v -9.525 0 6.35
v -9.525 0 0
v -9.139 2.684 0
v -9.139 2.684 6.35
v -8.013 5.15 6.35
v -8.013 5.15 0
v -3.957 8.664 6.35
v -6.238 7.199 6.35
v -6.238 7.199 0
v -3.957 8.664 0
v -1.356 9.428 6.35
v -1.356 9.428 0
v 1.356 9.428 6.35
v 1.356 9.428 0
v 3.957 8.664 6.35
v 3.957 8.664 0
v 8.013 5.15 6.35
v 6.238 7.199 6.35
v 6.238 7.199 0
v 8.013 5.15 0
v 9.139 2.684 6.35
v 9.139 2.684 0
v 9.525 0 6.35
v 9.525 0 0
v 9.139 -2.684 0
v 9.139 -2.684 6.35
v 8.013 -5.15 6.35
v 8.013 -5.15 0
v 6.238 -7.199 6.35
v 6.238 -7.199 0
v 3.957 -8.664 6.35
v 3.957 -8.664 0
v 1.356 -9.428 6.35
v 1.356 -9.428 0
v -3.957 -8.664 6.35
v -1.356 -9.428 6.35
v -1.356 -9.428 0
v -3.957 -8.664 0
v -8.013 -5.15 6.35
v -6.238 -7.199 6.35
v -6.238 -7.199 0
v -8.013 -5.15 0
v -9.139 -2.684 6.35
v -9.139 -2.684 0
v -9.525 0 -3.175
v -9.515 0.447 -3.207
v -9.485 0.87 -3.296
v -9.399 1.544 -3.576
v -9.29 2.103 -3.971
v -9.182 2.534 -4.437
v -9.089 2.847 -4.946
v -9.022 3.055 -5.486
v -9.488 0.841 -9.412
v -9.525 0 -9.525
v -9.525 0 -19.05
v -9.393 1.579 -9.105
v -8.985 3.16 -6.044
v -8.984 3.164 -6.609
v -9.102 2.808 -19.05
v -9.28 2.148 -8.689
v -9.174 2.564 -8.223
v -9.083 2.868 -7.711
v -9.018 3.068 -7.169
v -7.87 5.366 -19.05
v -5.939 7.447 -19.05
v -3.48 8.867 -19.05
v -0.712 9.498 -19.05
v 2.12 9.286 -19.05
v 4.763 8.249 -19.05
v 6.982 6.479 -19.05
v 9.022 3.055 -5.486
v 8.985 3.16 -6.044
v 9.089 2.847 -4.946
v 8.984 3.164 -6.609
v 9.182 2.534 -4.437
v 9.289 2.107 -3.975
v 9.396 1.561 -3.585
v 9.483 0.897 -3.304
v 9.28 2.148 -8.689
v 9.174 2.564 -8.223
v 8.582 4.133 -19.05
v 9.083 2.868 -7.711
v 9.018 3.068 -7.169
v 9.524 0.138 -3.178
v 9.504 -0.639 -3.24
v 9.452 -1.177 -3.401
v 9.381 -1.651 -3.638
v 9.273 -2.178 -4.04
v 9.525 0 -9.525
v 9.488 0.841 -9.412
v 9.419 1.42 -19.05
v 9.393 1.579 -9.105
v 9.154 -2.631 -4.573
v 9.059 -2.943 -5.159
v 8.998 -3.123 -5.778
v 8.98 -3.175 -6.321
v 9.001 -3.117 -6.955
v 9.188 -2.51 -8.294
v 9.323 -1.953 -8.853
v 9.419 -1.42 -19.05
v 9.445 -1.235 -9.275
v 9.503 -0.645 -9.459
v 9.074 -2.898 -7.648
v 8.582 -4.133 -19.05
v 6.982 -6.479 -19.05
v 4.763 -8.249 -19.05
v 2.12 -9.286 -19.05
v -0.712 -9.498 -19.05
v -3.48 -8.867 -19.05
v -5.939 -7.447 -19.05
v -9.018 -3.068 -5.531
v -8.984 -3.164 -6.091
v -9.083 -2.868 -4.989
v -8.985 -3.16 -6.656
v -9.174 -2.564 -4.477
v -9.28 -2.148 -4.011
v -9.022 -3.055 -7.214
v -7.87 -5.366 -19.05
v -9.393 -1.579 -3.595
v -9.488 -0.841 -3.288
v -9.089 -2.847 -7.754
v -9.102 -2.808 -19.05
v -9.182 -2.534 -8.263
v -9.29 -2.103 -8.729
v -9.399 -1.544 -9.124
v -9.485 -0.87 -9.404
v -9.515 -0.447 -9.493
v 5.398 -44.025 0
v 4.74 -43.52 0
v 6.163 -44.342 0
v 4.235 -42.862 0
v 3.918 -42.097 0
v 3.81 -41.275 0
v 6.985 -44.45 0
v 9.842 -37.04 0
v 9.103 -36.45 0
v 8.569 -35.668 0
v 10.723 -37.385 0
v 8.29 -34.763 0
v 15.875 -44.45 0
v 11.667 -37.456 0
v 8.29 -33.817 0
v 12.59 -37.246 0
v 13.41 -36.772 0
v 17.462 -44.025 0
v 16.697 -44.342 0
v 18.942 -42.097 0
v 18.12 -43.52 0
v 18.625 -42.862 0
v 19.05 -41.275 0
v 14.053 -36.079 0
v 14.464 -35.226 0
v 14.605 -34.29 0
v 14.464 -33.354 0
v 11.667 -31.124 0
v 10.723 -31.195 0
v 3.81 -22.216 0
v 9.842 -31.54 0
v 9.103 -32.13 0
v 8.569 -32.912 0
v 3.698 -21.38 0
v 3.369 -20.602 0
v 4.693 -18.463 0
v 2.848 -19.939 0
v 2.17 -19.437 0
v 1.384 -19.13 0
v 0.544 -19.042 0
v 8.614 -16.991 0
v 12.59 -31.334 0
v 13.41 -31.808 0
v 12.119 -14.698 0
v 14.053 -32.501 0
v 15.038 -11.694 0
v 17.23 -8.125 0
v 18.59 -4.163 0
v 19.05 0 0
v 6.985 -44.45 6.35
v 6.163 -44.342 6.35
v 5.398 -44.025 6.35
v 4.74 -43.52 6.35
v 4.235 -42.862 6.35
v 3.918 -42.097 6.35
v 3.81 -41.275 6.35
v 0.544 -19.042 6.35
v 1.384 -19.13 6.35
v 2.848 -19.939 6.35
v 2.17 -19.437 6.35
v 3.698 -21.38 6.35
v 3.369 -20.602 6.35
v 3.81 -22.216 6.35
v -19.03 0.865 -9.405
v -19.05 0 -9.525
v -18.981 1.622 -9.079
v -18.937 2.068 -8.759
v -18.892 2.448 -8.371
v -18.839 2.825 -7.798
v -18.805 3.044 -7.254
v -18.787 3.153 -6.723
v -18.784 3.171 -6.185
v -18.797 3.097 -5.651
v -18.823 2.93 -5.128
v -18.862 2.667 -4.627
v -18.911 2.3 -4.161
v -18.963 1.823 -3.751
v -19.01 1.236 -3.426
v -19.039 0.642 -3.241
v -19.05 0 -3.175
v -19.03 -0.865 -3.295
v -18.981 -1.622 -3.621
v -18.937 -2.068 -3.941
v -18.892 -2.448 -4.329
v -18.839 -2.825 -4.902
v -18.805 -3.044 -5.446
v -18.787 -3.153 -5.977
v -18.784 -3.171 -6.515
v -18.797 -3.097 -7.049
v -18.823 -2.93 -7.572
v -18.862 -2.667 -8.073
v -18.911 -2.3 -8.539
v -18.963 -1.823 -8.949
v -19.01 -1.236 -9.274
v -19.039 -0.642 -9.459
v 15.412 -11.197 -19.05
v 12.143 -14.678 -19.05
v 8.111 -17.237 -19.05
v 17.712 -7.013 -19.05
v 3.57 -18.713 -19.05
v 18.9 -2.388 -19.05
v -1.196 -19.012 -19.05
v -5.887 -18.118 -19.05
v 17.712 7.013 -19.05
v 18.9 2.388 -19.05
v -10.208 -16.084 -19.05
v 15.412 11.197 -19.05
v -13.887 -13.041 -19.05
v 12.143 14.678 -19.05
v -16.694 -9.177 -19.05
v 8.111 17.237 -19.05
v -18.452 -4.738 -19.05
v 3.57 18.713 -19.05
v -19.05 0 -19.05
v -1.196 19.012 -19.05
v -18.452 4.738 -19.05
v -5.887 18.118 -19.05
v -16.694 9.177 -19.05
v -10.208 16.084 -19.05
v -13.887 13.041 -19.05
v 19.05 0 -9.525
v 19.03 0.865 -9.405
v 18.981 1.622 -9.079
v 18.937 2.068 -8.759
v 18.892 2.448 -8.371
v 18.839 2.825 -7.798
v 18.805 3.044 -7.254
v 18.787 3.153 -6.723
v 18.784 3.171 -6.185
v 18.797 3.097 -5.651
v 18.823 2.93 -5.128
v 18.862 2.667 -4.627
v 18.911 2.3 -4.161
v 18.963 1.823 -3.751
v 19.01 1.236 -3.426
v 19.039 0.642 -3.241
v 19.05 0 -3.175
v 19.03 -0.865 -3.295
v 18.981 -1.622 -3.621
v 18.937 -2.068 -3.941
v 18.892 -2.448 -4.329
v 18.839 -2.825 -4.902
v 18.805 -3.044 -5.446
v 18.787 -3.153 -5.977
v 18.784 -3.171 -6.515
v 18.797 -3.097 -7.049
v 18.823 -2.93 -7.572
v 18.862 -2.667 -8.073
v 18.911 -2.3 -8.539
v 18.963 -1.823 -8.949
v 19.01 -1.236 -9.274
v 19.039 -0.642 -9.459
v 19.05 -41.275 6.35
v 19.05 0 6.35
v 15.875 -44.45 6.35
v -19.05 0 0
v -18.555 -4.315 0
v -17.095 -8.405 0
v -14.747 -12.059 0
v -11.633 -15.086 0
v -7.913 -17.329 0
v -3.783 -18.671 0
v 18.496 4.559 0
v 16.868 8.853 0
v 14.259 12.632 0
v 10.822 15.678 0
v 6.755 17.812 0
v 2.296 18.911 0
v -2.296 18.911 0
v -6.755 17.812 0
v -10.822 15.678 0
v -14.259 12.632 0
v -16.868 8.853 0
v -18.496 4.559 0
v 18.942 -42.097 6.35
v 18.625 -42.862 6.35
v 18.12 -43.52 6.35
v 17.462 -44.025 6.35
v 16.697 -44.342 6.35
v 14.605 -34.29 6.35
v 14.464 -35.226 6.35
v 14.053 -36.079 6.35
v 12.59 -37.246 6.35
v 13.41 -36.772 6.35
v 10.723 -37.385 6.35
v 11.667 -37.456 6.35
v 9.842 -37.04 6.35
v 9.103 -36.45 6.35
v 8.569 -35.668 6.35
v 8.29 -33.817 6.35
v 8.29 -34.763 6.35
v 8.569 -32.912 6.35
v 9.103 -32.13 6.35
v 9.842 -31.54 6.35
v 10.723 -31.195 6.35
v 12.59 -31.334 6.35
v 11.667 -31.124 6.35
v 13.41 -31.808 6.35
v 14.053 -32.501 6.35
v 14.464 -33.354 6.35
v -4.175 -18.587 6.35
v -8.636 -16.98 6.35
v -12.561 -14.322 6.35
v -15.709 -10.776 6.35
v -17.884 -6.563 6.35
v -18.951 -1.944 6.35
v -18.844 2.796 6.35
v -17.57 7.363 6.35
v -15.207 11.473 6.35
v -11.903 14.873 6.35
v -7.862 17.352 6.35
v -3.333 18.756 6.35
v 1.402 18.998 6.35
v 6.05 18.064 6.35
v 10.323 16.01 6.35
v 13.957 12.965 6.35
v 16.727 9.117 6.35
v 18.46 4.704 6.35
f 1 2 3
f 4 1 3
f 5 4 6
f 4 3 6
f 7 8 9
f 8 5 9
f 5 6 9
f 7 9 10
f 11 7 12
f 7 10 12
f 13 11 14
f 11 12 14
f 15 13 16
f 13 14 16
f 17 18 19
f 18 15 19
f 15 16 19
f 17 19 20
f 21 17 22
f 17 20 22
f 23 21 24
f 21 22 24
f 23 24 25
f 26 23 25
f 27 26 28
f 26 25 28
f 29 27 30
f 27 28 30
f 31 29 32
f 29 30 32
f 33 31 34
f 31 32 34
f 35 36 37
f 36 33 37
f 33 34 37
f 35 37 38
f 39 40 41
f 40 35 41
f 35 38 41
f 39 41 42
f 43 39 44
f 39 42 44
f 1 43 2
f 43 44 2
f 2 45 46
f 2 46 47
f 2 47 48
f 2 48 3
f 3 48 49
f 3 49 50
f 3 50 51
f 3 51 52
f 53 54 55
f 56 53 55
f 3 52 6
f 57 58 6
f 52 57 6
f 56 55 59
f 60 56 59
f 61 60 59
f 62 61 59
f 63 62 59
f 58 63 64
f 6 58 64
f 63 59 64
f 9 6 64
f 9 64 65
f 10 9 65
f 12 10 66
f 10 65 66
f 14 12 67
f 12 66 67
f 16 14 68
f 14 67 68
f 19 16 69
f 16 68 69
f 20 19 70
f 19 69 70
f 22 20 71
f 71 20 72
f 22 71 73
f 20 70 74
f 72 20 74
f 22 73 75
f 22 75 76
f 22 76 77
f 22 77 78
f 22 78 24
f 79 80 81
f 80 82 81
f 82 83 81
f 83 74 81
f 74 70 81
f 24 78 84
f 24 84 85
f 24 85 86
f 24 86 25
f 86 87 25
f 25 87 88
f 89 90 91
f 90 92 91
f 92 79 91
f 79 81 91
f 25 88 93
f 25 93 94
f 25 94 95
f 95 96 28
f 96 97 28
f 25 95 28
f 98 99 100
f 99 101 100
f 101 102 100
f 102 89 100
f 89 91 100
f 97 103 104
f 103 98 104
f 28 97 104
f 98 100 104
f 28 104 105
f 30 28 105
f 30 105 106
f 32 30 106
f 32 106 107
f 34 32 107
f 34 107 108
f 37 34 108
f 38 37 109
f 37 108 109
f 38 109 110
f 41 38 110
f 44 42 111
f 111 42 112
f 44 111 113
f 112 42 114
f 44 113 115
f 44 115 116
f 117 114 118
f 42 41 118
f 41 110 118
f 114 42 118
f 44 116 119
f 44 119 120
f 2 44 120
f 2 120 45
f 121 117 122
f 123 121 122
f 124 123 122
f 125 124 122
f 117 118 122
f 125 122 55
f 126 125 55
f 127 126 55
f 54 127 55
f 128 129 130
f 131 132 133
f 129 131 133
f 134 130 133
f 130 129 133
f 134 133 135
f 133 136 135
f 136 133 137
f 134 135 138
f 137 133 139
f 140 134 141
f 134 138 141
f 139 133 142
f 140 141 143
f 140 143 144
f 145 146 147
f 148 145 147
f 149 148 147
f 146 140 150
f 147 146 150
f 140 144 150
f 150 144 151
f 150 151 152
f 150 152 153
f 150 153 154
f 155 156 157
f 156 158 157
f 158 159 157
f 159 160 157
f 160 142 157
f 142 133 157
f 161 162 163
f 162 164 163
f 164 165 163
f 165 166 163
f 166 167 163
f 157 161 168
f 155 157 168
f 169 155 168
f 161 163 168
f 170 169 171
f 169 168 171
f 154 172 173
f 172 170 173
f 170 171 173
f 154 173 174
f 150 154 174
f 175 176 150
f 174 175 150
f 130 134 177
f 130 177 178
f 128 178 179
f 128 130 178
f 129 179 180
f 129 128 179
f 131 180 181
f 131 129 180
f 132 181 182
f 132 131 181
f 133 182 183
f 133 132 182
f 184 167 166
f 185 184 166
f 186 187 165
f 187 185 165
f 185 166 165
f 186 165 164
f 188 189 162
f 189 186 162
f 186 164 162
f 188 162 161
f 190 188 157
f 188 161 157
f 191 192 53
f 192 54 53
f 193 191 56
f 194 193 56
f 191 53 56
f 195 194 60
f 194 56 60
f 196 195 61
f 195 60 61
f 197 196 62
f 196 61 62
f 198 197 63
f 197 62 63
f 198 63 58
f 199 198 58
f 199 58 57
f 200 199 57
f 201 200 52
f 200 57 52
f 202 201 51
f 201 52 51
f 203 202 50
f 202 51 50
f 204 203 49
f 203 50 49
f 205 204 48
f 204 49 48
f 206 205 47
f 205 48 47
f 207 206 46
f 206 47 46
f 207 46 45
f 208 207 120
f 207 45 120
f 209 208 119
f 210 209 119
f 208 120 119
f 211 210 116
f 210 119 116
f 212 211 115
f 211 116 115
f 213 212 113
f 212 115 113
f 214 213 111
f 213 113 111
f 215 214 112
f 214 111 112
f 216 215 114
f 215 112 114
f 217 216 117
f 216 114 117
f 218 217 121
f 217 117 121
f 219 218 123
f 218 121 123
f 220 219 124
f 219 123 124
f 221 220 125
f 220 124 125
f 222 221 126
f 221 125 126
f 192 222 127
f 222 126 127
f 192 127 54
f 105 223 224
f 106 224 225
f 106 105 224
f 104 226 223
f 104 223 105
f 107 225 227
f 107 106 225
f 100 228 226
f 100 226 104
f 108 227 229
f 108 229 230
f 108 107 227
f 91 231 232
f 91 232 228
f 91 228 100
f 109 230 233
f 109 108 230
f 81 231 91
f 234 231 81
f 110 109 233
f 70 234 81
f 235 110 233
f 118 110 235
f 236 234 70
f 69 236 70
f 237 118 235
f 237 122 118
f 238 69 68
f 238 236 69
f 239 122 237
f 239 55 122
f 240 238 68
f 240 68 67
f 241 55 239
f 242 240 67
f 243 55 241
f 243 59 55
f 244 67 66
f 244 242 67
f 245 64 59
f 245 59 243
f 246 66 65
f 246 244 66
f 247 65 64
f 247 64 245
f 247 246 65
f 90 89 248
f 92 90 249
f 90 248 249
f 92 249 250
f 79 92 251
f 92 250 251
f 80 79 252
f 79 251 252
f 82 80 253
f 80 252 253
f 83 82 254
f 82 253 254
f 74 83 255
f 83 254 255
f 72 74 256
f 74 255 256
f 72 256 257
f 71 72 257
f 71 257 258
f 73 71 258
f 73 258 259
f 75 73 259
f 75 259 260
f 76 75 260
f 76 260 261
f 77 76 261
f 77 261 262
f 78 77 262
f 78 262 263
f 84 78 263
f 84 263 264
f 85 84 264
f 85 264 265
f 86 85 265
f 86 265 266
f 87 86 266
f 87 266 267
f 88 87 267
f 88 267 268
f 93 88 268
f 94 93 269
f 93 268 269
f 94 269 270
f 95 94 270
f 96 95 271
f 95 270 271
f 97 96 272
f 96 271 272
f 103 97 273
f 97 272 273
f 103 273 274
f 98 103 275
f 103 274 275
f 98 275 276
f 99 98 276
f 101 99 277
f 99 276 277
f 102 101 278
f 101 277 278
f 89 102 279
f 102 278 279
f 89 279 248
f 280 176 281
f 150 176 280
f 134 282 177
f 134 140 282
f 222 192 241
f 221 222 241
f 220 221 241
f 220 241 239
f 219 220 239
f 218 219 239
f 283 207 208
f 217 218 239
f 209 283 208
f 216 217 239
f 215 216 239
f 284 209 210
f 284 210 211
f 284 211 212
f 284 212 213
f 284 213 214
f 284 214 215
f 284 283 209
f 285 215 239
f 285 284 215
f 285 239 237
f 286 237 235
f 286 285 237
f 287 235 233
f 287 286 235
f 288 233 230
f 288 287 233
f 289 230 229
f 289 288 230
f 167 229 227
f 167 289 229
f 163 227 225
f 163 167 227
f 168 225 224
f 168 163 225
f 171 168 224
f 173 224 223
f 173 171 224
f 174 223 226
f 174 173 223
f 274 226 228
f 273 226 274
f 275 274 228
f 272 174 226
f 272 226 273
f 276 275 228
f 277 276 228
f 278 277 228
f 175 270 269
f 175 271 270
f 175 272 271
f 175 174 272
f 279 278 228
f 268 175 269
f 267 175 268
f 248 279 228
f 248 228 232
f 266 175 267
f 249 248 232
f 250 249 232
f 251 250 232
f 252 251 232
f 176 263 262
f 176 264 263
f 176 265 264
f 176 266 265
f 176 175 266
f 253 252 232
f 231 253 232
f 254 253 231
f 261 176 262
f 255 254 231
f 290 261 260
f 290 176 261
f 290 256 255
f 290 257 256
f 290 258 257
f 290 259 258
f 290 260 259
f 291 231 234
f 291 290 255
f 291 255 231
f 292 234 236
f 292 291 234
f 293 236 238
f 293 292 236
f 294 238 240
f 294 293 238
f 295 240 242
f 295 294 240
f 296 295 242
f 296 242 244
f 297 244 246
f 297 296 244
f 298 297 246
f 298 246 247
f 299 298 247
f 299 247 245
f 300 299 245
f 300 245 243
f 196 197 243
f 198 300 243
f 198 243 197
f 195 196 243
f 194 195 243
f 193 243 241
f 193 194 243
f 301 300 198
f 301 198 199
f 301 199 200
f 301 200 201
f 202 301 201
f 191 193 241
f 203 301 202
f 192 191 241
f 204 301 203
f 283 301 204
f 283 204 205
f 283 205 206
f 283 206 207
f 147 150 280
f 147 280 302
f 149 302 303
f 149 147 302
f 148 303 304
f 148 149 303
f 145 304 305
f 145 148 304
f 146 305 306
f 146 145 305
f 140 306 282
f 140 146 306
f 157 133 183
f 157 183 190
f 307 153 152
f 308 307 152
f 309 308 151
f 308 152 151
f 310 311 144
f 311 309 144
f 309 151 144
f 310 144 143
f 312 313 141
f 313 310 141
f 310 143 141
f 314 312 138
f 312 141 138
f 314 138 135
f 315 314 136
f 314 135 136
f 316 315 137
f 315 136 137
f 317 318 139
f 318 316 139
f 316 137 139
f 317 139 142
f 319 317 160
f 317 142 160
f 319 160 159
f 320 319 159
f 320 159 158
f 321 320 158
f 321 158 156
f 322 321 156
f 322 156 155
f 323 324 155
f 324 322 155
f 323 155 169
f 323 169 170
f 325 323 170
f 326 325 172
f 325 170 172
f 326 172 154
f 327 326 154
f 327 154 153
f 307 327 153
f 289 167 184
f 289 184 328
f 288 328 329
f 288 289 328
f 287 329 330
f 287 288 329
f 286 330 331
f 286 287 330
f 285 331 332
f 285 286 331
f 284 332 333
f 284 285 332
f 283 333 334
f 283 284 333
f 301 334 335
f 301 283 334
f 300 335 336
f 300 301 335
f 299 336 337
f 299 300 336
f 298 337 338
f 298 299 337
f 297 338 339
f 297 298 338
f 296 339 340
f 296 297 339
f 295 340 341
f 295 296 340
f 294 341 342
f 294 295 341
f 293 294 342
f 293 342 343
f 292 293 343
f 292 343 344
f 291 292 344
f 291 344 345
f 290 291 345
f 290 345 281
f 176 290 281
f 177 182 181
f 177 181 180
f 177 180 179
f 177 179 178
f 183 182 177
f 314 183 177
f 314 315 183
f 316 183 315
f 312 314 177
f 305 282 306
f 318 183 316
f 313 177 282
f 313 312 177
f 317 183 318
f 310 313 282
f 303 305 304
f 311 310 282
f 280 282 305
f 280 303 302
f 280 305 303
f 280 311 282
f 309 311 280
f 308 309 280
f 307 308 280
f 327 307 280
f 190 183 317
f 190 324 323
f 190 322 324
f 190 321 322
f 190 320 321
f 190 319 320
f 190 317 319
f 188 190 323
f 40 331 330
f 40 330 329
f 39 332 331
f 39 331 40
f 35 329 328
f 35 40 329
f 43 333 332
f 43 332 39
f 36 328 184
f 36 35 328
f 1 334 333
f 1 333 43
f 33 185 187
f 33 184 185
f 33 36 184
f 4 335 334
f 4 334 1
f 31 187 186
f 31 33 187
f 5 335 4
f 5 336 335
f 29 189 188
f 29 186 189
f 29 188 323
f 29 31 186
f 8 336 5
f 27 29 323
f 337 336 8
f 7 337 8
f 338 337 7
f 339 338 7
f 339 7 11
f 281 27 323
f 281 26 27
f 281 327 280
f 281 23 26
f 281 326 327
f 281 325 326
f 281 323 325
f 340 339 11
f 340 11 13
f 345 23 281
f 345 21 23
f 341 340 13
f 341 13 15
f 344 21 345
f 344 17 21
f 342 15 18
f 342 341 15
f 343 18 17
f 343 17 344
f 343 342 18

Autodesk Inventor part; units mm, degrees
ref_plane "YZ Plane" through (0, 0, 0) normal (1, 0, 0) x (0, 1, 0)
ref_plane "XZ Plane" through (0, 0, 0) normal (0, 1, 0) x (-1, 0, 0)
ref_plane "XY Plane" through (0, 0, 0) normal (0, 0, 1) x (1, 0, 0)
sketch "Sketch1" plane through (0, 0, 0) normal (0, 0, 1) x (1, 0, 0)
  arc A0 (19.05, 0) -> (0.5443, -19.0422) centre (0, 0) ccw
  circle A1 centre (0, 0) radius 9.525
  line L0 (19.05, 0) -> (19.05, -41.275)
  line L1 (15.875, -44.45) -> (6.985, -44.45)
  line L2 (3.81, -41.275) -> (3.81, -22.2159)
  circle A2 centre (11.43, -34.29) radius 3.175
  arc A3 (3.81, -41.275) -> (6.985, -44.45) centre (6.985, -41.275) ccw
  arc A4 (15.875, -44.45) -> (19.05, -41.275) centre (15.875, -41.275) ccw
  arc A5 (3.81, -22.2159) -> (0.5443, -19.0422) centre (0.635, -22.2159) ccw
  point P0 (19.05, -44.45)
  point P1 (3.81, -44.45)
  point P2 (3.81, -18.6651)
  dimension "d0" = 38.1
  dimension "d1" = 19.05
  dimension "d2" = 44.45
  dimension "d3" = 15.24
  dimension "d4" = 6.35
  dimension "d5" = 7.62
  dimension "d6" = 10.16
  dimension "d7" = 3.175
  dimension "d8" = 3.175
extrude "Extrusion1" add sketch "Sketch1" along normal blind 6.35
sketch "Sketch2" plane through (0, 0, 0) normal (0, 0, -1) x (-1, 0, 0)
  circle A0 centre (0, 0) radius 19.05
  dimension "d11" = 38.1
extrude "Extrusion2" add sketch "Sketch2" along normal blind 19.05
sketch "Sketch3" plane through (0, 0, -19.05) normal (0, 0, -1) x (-1, 0, 0)
  circle A0 centre (0, 0) radius 9.525
  dimension "d14" = 19.05
extrude "Extrusion3" cut sketch "Sketch3" against normal through all
sketch "Sketch4" plane through (19.05, -41.275, 0) normal (1, 0, 0) x (0, 0, -1)
  circle A0 centre (6.35, 41.275) radius 3.175
  line L0 (19.05, 22.225) -> (19.05, 60.325) projected
  point P0 (0, 41.275)
  dimension "d17" = 6.35
  dimension "d18" = 0
  dimension "d19" = 12.7
extrude "Extrusion4" cut sketch "Sketch4" against normal through all
properties part number "HW 4 Part 6" material "Aluminum 6061"
